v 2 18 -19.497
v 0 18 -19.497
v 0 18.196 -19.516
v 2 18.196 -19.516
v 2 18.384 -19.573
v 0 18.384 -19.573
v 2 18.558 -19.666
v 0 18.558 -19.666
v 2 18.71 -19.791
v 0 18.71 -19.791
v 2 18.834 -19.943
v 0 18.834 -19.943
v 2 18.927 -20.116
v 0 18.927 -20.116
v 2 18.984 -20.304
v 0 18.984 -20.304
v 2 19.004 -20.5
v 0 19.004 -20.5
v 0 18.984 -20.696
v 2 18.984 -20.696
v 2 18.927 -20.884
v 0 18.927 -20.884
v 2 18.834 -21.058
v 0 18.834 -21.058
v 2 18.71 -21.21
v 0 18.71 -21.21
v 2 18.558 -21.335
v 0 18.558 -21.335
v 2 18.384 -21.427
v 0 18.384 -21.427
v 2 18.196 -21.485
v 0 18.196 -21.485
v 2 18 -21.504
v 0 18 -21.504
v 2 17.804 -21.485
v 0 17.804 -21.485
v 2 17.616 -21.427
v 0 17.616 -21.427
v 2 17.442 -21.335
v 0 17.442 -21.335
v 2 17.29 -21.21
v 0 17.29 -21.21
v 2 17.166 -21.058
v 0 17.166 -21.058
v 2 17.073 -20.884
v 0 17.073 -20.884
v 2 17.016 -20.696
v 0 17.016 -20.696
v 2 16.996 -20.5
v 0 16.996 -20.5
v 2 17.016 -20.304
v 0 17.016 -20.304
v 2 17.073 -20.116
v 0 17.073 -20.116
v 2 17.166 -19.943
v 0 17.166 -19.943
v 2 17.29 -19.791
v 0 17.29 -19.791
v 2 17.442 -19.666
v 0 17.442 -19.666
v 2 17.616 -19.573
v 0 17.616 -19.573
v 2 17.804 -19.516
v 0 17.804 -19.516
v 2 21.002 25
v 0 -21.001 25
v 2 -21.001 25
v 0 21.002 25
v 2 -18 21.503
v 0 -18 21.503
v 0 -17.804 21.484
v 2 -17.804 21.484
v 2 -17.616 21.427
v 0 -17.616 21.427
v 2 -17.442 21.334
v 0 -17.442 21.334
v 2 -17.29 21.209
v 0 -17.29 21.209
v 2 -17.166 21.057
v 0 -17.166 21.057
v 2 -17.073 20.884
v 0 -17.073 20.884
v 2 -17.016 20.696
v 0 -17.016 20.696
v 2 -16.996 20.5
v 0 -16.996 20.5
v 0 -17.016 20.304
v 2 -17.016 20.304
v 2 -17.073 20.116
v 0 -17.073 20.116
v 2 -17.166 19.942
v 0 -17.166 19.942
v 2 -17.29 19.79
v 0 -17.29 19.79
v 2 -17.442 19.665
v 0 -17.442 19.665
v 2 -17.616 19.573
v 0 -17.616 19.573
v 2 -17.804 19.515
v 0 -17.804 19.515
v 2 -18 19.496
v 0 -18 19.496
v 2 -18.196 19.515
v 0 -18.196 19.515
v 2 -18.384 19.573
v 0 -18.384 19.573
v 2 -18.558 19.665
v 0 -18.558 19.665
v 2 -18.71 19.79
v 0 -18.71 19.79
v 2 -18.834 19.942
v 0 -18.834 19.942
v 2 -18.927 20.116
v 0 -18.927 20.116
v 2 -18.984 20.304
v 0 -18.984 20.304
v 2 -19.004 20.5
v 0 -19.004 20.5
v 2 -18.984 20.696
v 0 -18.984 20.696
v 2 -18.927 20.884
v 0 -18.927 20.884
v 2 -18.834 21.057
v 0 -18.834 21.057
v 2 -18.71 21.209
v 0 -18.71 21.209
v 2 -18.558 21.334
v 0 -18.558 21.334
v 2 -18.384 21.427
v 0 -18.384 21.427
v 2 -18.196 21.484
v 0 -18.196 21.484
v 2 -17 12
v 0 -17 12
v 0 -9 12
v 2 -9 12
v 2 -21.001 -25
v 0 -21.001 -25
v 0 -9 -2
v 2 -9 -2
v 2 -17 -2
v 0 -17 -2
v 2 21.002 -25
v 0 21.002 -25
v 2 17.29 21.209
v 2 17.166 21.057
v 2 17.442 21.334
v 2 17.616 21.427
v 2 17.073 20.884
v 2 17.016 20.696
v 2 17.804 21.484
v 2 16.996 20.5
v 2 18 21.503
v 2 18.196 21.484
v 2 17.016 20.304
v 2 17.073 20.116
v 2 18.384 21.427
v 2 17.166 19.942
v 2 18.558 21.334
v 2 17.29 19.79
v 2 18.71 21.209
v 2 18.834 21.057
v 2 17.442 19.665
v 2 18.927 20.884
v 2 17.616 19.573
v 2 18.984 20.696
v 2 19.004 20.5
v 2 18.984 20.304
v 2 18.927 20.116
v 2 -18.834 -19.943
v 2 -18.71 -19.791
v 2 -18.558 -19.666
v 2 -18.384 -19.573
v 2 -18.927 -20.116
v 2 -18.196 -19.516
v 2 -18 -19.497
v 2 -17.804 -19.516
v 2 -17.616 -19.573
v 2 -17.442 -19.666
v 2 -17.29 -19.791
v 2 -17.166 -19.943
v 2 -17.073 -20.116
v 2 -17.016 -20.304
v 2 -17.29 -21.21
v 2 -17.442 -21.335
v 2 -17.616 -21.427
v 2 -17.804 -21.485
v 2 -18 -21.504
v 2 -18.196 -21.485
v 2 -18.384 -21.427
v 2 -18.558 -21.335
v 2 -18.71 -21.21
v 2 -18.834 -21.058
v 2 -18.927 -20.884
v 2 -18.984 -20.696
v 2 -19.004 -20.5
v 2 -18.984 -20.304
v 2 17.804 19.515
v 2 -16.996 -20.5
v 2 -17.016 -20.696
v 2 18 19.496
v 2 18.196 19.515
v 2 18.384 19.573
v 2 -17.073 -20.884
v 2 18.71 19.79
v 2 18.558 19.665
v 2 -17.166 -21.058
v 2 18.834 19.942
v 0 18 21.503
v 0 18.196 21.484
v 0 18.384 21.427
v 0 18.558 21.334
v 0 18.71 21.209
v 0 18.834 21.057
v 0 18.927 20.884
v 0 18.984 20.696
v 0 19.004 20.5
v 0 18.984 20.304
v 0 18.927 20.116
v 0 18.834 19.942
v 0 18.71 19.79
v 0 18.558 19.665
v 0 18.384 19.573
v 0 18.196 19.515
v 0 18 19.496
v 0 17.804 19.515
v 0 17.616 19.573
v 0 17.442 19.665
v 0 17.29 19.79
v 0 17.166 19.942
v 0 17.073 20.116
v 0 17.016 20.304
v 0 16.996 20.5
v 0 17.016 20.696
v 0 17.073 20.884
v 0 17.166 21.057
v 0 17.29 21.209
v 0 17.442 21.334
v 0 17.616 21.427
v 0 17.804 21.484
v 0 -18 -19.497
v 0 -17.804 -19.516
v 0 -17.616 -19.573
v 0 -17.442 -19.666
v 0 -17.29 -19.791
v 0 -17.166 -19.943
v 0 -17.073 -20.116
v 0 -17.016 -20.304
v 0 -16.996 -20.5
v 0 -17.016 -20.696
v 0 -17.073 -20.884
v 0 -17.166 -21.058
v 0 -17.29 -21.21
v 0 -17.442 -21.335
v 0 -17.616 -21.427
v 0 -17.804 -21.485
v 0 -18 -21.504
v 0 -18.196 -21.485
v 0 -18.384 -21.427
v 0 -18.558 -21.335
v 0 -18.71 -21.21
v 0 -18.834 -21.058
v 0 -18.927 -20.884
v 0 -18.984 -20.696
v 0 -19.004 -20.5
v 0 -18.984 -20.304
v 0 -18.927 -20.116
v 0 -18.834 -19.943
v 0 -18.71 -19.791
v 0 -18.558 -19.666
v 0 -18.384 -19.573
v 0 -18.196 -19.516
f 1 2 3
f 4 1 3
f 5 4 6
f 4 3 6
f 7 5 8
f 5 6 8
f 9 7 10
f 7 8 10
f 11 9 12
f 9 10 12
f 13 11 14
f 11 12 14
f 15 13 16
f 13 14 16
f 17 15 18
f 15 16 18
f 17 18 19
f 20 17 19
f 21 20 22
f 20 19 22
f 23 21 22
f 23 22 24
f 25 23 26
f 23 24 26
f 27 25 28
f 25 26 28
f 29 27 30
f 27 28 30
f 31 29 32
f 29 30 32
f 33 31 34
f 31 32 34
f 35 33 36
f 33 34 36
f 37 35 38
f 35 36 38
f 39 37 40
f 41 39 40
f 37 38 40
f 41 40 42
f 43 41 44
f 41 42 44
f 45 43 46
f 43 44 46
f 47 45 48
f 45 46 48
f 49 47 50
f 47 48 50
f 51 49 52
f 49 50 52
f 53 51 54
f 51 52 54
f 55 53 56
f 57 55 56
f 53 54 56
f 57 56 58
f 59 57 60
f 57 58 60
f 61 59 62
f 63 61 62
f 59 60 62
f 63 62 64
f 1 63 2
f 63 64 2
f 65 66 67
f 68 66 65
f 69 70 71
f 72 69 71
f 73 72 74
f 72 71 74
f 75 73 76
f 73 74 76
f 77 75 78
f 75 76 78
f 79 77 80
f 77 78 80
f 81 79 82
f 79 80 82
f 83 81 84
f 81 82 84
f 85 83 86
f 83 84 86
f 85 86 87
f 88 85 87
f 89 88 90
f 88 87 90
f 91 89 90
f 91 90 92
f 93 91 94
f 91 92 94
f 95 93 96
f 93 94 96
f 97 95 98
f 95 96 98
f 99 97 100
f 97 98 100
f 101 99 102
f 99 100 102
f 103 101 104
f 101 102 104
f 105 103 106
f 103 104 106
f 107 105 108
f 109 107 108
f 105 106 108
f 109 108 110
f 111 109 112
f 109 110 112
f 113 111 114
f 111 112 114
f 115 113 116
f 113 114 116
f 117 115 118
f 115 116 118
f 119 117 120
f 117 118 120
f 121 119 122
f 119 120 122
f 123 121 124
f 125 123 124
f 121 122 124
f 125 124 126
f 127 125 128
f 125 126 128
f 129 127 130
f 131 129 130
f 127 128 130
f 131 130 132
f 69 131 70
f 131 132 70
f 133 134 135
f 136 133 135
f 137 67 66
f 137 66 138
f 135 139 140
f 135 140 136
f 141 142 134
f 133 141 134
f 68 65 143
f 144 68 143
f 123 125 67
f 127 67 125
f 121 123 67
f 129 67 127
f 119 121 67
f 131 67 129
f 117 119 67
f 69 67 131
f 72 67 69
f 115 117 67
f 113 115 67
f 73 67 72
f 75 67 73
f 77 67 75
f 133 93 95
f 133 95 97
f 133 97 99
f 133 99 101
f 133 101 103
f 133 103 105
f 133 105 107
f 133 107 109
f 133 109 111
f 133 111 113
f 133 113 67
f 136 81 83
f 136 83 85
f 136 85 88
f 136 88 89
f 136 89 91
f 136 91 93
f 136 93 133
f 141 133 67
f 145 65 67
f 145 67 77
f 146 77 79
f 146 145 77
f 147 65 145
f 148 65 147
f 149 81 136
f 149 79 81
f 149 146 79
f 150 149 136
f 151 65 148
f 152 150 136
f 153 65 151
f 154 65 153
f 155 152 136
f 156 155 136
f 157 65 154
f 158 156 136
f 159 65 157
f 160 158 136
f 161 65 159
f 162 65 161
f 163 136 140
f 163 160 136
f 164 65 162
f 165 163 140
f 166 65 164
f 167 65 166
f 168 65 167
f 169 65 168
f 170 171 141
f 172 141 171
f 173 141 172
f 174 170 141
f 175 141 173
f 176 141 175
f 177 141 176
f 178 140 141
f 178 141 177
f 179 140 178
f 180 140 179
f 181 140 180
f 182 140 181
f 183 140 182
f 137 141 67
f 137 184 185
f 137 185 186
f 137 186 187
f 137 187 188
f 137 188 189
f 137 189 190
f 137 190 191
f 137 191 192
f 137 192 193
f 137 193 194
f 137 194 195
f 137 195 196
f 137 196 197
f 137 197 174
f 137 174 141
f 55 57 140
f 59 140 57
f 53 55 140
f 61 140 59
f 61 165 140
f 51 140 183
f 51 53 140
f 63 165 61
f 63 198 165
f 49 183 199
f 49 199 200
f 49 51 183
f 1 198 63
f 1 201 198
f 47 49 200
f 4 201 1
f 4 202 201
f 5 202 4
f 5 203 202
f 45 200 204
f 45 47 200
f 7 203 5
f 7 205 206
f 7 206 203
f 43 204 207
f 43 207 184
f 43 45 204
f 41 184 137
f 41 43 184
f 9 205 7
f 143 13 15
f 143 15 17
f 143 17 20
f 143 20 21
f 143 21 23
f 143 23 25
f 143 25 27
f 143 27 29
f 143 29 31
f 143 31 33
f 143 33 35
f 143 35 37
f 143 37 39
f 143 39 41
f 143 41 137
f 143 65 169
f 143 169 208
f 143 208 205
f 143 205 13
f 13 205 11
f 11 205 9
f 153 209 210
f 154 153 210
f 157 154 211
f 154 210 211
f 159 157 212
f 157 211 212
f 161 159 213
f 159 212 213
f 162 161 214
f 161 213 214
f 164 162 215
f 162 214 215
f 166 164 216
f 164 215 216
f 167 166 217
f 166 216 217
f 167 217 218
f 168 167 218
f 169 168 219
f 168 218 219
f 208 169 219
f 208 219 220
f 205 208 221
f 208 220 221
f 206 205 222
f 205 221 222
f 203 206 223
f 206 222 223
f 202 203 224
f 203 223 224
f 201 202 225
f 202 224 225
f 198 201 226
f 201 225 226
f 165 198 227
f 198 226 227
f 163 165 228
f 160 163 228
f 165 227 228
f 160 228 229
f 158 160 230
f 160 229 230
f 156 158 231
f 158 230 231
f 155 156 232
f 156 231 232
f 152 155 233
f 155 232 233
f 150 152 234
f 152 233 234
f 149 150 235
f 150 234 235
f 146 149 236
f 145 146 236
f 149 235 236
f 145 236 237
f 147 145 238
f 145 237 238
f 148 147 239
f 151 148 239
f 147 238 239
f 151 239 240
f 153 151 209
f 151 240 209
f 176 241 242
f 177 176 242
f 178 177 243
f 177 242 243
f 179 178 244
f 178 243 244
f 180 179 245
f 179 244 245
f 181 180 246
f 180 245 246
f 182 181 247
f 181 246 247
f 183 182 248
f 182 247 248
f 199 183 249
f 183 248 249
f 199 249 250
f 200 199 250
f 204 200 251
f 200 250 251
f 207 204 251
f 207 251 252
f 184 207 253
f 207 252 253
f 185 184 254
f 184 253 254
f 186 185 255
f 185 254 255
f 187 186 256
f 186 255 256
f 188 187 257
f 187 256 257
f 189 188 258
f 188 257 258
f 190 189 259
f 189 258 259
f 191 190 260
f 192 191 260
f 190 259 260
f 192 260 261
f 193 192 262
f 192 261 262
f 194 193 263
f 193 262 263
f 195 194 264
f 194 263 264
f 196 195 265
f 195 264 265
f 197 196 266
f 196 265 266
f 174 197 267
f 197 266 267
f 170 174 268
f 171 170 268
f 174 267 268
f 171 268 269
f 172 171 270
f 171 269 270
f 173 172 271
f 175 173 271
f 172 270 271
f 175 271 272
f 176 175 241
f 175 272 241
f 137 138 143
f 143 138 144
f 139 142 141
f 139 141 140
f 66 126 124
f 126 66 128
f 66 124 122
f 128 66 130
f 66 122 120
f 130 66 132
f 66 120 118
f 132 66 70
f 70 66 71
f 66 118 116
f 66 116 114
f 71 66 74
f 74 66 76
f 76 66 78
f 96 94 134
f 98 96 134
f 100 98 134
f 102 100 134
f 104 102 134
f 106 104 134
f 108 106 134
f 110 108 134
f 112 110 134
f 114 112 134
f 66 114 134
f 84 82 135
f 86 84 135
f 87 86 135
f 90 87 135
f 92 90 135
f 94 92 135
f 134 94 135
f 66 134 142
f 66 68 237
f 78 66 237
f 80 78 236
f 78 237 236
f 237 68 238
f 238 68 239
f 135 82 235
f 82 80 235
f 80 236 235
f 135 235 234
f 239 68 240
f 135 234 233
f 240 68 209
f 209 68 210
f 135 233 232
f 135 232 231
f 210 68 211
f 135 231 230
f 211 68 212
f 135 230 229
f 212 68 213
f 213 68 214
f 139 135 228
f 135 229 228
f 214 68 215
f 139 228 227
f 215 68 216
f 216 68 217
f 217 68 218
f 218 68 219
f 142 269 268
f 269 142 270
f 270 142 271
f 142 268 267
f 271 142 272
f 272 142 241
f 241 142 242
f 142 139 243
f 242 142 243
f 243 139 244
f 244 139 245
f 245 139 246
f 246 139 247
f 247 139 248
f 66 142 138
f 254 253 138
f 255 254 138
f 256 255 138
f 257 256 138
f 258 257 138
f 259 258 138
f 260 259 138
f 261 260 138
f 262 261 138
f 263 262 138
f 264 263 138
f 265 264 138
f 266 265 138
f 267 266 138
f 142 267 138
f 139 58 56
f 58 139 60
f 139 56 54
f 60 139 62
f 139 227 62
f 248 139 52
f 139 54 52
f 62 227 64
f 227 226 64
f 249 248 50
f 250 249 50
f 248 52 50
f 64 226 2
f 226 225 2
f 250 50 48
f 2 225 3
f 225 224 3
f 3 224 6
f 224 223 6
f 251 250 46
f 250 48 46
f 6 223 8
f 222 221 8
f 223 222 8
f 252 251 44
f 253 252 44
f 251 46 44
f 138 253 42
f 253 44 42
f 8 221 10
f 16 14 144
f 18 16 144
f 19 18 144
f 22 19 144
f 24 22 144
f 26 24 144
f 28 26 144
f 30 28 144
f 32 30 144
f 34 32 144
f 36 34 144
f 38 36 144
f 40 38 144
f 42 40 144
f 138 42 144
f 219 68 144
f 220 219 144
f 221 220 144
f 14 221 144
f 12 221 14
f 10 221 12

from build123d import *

# Parameters (mm, degrees)
SKETCH1_W            = 50
SKETCH1_H            = 44
BOSS_EXTRUDE1_DEPTH  = 2
SKETCH2_R            = 1.003593064
SKETCH2_W            = 14
SKETCH2_H            = 8
CUT_EXTRUDE1_DEPTH   = 2
LPATTERN1_COUNT      = 2
LPATTERN1_PITCH      = 41
LPATTERN1_COUNT_DIR2 = 2
LPATTERN1_PITCH_DIR2 = 36
SKETCH6_W            = 50
SKETCH6_H            = 0.998412165
CUT_EXTRUDE2_DEPTH   = 5
SKETCH7_W            = 50
SKETCH7_H            = 0.999196335
CUT_EXTRUDE3_DEPTH   = 5


with BuildPart() as part:
    # Sketch1 → Boss-Extrude1 (new body)
    with BuildSketch(Plane(origin=(0, 0, 0), x_dir=(0, 0, -1), z_dir=(1, 0, 0))):
        Rectangle(SKETCH1_W, SKETCH1_H)
    extrude(amount=BOSS_EXTRUDE1_DEPTH)

    # Sketch2 → Cut-Extrude1 (cut)
    with BuildSketch(Plane.ZY):
        with Locations((20.499792875, 18)):
            Circle(SKETCH2_R)
        with Locations((5, -13)):
            Rectangle(SKETCH2_W, SKETCH2_H)
    cut_extrude1 = extrude(amount=-CUT_EXTRUDE1_DEPTH, mode=Mode.SUBTRACT)

    # LPattern1: Cut-Extrude1 2 × 2
    with Locations(*[(0, -j * LPATTERN1_PITCH_DIR2, -i * LPATTERN1_PITCH) for i in range(LPATTERN1_COUNT) for j in range(LPATTERN1_COUNT_DIR2) if (i, j) != (0, 0)]):
        add(cut_extrude1, mode=Mode.SUBTRACT)

    # Sketch6 → Cut-Extrude2 (cut)
    with BuildSketch(Plane(origin=(2, 0, 0), x_dir=(0, 0, -1), z_dir=(1, 0, 0))):
        with Locations((0, 21.500793918)):
            Rectangle(SKETCH6_W, SKETCH6_H)
    extrude(amount=-CUT_EXTRUDE2_DEPTH, mode=Mode.SUBTRACT)

    # Sketch7 → Cut-Extrude3 (cut)
    with BuildSketch(Plane(origin=(2, 0, 0), x_dir=(0, 0, -1), z_dir=(1, 0, 0))):
        with Locations((0, -21.500401833)):
            Rectangle(SKETCH7_W, SKETCH7_H)
    extrude(amount=-CUT_EXTRUDE3_DEPTH, mode=Mode.SUBTRACT)


solid = part.part
